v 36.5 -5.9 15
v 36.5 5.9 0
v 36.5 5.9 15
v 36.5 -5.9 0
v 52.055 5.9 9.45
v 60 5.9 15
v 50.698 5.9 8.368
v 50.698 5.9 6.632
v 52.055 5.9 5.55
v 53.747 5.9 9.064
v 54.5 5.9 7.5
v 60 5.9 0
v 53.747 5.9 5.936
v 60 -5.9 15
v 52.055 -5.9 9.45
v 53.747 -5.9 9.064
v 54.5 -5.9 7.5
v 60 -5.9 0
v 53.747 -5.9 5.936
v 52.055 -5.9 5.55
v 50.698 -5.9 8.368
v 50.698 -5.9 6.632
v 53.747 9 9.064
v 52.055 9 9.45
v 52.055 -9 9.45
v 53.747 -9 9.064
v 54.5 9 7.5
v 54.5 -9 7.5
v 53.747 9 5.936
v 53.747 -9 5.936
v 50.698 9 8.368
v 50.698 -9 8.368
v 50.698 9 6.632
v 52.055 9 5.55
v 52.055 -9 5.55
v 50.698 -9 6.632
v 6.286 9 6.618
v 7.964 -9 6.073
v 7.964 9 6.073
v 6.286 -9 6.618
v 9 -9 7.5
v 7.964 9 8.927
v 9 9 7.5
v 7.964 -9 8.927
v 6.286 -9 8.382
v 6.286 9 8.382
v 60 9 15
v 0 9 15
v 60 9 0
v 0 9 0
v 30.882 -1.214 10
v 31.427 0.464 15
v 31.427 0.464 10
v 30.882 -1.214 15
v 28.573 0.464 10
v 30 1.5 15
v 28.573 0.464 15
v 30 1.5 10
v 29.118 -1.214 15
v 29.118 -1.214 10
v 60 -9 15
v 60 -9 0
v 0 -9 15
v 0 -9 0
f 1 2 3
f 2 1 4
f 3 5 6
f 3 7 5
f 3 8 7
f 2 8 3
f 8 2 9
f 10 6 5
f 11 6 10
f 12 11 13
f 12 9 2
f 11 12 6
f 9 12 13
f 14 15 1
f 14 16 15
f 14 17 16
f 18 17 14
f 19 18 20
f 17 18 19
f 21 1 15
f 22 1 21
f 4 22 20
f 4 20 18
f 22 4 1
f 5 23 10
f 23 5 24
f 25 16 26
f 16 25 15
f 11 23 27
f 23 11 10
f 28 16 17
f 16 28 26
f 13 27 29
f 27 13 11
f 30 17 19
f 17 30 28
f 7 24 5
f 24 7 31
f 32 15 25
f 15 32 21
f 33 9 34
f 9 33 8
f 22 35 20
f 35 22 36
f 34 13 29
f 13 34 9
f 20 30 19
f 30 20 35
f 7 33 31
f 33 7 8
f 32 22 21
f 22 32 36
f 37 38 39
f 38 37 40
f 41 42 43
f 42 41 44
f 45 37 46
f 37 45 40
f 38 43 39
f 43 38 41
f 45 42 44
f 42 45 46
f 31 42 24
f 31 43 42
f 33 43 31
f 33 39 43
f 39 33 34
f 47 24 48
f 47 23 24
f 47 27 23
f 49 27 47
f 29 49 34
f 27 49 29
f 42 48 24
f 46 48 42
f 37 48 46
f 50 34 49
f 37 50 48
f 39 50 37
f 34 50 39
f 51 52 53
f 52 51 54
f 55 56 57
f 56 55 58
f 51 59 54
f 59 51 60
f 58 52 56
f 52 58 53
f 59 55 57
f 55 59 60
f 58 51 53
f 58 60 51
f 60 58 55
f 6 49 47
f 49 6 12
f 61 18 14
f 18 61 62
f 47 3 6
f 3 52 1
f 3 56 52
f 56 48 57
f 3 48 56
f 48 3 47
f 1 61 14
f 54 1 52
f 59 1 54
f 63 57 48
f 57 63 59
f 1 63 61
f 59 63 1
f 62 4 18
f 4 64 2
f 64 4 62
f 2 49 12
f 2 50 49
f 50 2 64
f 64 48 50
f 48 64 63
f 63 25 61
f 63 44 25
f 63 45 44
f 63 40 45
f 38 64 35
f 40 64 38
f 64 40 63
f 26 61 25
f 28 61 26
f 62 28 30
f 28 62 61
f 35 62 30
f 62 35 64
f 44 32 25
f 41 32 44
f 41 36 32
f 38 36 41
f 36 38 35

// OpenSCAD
slotwidth=11.8;
height=15;
width=18;
pulleyholeoffset=7.5;
pulleyholeradius=4.0/2;
pulleyradius=16;
mountholeoffset=7.5;
mountholeradius=3.0/2;
springholeoffset=30;
springholedepth=5;
length=60;
difference() {
   // Main form
   translate([0,-width/2,0]) cube([length, width, height]);
   union() {
      // Gap
      translate([length-pulleyholeoffset-pulleyradius, -slotwidth/2, -1]) 
         cube([pulleyholeoffset+pulleyradius+1, slotwidth, height+2]);
      // Pulley hole
      rotate([90, 0, 0]) translate([length-pulleyholeoffset, height/2, -width/2-1]) 
         cylinder(r = pulleyholeradius, h = width+2);
      // Mount hole
      rotate([90, 0, 0]) translate([mountholeoffset, height/2, -width/2]) 
         cylinder(r = mountholeradius, h = width+2);
      // Spring hole
      translate([springholeoffset, 0, height-springholedepth]) rotate([0, 0, 90]) 
         cylinder(r = mountholeradius, h = springholedepth+1);
   }
}
